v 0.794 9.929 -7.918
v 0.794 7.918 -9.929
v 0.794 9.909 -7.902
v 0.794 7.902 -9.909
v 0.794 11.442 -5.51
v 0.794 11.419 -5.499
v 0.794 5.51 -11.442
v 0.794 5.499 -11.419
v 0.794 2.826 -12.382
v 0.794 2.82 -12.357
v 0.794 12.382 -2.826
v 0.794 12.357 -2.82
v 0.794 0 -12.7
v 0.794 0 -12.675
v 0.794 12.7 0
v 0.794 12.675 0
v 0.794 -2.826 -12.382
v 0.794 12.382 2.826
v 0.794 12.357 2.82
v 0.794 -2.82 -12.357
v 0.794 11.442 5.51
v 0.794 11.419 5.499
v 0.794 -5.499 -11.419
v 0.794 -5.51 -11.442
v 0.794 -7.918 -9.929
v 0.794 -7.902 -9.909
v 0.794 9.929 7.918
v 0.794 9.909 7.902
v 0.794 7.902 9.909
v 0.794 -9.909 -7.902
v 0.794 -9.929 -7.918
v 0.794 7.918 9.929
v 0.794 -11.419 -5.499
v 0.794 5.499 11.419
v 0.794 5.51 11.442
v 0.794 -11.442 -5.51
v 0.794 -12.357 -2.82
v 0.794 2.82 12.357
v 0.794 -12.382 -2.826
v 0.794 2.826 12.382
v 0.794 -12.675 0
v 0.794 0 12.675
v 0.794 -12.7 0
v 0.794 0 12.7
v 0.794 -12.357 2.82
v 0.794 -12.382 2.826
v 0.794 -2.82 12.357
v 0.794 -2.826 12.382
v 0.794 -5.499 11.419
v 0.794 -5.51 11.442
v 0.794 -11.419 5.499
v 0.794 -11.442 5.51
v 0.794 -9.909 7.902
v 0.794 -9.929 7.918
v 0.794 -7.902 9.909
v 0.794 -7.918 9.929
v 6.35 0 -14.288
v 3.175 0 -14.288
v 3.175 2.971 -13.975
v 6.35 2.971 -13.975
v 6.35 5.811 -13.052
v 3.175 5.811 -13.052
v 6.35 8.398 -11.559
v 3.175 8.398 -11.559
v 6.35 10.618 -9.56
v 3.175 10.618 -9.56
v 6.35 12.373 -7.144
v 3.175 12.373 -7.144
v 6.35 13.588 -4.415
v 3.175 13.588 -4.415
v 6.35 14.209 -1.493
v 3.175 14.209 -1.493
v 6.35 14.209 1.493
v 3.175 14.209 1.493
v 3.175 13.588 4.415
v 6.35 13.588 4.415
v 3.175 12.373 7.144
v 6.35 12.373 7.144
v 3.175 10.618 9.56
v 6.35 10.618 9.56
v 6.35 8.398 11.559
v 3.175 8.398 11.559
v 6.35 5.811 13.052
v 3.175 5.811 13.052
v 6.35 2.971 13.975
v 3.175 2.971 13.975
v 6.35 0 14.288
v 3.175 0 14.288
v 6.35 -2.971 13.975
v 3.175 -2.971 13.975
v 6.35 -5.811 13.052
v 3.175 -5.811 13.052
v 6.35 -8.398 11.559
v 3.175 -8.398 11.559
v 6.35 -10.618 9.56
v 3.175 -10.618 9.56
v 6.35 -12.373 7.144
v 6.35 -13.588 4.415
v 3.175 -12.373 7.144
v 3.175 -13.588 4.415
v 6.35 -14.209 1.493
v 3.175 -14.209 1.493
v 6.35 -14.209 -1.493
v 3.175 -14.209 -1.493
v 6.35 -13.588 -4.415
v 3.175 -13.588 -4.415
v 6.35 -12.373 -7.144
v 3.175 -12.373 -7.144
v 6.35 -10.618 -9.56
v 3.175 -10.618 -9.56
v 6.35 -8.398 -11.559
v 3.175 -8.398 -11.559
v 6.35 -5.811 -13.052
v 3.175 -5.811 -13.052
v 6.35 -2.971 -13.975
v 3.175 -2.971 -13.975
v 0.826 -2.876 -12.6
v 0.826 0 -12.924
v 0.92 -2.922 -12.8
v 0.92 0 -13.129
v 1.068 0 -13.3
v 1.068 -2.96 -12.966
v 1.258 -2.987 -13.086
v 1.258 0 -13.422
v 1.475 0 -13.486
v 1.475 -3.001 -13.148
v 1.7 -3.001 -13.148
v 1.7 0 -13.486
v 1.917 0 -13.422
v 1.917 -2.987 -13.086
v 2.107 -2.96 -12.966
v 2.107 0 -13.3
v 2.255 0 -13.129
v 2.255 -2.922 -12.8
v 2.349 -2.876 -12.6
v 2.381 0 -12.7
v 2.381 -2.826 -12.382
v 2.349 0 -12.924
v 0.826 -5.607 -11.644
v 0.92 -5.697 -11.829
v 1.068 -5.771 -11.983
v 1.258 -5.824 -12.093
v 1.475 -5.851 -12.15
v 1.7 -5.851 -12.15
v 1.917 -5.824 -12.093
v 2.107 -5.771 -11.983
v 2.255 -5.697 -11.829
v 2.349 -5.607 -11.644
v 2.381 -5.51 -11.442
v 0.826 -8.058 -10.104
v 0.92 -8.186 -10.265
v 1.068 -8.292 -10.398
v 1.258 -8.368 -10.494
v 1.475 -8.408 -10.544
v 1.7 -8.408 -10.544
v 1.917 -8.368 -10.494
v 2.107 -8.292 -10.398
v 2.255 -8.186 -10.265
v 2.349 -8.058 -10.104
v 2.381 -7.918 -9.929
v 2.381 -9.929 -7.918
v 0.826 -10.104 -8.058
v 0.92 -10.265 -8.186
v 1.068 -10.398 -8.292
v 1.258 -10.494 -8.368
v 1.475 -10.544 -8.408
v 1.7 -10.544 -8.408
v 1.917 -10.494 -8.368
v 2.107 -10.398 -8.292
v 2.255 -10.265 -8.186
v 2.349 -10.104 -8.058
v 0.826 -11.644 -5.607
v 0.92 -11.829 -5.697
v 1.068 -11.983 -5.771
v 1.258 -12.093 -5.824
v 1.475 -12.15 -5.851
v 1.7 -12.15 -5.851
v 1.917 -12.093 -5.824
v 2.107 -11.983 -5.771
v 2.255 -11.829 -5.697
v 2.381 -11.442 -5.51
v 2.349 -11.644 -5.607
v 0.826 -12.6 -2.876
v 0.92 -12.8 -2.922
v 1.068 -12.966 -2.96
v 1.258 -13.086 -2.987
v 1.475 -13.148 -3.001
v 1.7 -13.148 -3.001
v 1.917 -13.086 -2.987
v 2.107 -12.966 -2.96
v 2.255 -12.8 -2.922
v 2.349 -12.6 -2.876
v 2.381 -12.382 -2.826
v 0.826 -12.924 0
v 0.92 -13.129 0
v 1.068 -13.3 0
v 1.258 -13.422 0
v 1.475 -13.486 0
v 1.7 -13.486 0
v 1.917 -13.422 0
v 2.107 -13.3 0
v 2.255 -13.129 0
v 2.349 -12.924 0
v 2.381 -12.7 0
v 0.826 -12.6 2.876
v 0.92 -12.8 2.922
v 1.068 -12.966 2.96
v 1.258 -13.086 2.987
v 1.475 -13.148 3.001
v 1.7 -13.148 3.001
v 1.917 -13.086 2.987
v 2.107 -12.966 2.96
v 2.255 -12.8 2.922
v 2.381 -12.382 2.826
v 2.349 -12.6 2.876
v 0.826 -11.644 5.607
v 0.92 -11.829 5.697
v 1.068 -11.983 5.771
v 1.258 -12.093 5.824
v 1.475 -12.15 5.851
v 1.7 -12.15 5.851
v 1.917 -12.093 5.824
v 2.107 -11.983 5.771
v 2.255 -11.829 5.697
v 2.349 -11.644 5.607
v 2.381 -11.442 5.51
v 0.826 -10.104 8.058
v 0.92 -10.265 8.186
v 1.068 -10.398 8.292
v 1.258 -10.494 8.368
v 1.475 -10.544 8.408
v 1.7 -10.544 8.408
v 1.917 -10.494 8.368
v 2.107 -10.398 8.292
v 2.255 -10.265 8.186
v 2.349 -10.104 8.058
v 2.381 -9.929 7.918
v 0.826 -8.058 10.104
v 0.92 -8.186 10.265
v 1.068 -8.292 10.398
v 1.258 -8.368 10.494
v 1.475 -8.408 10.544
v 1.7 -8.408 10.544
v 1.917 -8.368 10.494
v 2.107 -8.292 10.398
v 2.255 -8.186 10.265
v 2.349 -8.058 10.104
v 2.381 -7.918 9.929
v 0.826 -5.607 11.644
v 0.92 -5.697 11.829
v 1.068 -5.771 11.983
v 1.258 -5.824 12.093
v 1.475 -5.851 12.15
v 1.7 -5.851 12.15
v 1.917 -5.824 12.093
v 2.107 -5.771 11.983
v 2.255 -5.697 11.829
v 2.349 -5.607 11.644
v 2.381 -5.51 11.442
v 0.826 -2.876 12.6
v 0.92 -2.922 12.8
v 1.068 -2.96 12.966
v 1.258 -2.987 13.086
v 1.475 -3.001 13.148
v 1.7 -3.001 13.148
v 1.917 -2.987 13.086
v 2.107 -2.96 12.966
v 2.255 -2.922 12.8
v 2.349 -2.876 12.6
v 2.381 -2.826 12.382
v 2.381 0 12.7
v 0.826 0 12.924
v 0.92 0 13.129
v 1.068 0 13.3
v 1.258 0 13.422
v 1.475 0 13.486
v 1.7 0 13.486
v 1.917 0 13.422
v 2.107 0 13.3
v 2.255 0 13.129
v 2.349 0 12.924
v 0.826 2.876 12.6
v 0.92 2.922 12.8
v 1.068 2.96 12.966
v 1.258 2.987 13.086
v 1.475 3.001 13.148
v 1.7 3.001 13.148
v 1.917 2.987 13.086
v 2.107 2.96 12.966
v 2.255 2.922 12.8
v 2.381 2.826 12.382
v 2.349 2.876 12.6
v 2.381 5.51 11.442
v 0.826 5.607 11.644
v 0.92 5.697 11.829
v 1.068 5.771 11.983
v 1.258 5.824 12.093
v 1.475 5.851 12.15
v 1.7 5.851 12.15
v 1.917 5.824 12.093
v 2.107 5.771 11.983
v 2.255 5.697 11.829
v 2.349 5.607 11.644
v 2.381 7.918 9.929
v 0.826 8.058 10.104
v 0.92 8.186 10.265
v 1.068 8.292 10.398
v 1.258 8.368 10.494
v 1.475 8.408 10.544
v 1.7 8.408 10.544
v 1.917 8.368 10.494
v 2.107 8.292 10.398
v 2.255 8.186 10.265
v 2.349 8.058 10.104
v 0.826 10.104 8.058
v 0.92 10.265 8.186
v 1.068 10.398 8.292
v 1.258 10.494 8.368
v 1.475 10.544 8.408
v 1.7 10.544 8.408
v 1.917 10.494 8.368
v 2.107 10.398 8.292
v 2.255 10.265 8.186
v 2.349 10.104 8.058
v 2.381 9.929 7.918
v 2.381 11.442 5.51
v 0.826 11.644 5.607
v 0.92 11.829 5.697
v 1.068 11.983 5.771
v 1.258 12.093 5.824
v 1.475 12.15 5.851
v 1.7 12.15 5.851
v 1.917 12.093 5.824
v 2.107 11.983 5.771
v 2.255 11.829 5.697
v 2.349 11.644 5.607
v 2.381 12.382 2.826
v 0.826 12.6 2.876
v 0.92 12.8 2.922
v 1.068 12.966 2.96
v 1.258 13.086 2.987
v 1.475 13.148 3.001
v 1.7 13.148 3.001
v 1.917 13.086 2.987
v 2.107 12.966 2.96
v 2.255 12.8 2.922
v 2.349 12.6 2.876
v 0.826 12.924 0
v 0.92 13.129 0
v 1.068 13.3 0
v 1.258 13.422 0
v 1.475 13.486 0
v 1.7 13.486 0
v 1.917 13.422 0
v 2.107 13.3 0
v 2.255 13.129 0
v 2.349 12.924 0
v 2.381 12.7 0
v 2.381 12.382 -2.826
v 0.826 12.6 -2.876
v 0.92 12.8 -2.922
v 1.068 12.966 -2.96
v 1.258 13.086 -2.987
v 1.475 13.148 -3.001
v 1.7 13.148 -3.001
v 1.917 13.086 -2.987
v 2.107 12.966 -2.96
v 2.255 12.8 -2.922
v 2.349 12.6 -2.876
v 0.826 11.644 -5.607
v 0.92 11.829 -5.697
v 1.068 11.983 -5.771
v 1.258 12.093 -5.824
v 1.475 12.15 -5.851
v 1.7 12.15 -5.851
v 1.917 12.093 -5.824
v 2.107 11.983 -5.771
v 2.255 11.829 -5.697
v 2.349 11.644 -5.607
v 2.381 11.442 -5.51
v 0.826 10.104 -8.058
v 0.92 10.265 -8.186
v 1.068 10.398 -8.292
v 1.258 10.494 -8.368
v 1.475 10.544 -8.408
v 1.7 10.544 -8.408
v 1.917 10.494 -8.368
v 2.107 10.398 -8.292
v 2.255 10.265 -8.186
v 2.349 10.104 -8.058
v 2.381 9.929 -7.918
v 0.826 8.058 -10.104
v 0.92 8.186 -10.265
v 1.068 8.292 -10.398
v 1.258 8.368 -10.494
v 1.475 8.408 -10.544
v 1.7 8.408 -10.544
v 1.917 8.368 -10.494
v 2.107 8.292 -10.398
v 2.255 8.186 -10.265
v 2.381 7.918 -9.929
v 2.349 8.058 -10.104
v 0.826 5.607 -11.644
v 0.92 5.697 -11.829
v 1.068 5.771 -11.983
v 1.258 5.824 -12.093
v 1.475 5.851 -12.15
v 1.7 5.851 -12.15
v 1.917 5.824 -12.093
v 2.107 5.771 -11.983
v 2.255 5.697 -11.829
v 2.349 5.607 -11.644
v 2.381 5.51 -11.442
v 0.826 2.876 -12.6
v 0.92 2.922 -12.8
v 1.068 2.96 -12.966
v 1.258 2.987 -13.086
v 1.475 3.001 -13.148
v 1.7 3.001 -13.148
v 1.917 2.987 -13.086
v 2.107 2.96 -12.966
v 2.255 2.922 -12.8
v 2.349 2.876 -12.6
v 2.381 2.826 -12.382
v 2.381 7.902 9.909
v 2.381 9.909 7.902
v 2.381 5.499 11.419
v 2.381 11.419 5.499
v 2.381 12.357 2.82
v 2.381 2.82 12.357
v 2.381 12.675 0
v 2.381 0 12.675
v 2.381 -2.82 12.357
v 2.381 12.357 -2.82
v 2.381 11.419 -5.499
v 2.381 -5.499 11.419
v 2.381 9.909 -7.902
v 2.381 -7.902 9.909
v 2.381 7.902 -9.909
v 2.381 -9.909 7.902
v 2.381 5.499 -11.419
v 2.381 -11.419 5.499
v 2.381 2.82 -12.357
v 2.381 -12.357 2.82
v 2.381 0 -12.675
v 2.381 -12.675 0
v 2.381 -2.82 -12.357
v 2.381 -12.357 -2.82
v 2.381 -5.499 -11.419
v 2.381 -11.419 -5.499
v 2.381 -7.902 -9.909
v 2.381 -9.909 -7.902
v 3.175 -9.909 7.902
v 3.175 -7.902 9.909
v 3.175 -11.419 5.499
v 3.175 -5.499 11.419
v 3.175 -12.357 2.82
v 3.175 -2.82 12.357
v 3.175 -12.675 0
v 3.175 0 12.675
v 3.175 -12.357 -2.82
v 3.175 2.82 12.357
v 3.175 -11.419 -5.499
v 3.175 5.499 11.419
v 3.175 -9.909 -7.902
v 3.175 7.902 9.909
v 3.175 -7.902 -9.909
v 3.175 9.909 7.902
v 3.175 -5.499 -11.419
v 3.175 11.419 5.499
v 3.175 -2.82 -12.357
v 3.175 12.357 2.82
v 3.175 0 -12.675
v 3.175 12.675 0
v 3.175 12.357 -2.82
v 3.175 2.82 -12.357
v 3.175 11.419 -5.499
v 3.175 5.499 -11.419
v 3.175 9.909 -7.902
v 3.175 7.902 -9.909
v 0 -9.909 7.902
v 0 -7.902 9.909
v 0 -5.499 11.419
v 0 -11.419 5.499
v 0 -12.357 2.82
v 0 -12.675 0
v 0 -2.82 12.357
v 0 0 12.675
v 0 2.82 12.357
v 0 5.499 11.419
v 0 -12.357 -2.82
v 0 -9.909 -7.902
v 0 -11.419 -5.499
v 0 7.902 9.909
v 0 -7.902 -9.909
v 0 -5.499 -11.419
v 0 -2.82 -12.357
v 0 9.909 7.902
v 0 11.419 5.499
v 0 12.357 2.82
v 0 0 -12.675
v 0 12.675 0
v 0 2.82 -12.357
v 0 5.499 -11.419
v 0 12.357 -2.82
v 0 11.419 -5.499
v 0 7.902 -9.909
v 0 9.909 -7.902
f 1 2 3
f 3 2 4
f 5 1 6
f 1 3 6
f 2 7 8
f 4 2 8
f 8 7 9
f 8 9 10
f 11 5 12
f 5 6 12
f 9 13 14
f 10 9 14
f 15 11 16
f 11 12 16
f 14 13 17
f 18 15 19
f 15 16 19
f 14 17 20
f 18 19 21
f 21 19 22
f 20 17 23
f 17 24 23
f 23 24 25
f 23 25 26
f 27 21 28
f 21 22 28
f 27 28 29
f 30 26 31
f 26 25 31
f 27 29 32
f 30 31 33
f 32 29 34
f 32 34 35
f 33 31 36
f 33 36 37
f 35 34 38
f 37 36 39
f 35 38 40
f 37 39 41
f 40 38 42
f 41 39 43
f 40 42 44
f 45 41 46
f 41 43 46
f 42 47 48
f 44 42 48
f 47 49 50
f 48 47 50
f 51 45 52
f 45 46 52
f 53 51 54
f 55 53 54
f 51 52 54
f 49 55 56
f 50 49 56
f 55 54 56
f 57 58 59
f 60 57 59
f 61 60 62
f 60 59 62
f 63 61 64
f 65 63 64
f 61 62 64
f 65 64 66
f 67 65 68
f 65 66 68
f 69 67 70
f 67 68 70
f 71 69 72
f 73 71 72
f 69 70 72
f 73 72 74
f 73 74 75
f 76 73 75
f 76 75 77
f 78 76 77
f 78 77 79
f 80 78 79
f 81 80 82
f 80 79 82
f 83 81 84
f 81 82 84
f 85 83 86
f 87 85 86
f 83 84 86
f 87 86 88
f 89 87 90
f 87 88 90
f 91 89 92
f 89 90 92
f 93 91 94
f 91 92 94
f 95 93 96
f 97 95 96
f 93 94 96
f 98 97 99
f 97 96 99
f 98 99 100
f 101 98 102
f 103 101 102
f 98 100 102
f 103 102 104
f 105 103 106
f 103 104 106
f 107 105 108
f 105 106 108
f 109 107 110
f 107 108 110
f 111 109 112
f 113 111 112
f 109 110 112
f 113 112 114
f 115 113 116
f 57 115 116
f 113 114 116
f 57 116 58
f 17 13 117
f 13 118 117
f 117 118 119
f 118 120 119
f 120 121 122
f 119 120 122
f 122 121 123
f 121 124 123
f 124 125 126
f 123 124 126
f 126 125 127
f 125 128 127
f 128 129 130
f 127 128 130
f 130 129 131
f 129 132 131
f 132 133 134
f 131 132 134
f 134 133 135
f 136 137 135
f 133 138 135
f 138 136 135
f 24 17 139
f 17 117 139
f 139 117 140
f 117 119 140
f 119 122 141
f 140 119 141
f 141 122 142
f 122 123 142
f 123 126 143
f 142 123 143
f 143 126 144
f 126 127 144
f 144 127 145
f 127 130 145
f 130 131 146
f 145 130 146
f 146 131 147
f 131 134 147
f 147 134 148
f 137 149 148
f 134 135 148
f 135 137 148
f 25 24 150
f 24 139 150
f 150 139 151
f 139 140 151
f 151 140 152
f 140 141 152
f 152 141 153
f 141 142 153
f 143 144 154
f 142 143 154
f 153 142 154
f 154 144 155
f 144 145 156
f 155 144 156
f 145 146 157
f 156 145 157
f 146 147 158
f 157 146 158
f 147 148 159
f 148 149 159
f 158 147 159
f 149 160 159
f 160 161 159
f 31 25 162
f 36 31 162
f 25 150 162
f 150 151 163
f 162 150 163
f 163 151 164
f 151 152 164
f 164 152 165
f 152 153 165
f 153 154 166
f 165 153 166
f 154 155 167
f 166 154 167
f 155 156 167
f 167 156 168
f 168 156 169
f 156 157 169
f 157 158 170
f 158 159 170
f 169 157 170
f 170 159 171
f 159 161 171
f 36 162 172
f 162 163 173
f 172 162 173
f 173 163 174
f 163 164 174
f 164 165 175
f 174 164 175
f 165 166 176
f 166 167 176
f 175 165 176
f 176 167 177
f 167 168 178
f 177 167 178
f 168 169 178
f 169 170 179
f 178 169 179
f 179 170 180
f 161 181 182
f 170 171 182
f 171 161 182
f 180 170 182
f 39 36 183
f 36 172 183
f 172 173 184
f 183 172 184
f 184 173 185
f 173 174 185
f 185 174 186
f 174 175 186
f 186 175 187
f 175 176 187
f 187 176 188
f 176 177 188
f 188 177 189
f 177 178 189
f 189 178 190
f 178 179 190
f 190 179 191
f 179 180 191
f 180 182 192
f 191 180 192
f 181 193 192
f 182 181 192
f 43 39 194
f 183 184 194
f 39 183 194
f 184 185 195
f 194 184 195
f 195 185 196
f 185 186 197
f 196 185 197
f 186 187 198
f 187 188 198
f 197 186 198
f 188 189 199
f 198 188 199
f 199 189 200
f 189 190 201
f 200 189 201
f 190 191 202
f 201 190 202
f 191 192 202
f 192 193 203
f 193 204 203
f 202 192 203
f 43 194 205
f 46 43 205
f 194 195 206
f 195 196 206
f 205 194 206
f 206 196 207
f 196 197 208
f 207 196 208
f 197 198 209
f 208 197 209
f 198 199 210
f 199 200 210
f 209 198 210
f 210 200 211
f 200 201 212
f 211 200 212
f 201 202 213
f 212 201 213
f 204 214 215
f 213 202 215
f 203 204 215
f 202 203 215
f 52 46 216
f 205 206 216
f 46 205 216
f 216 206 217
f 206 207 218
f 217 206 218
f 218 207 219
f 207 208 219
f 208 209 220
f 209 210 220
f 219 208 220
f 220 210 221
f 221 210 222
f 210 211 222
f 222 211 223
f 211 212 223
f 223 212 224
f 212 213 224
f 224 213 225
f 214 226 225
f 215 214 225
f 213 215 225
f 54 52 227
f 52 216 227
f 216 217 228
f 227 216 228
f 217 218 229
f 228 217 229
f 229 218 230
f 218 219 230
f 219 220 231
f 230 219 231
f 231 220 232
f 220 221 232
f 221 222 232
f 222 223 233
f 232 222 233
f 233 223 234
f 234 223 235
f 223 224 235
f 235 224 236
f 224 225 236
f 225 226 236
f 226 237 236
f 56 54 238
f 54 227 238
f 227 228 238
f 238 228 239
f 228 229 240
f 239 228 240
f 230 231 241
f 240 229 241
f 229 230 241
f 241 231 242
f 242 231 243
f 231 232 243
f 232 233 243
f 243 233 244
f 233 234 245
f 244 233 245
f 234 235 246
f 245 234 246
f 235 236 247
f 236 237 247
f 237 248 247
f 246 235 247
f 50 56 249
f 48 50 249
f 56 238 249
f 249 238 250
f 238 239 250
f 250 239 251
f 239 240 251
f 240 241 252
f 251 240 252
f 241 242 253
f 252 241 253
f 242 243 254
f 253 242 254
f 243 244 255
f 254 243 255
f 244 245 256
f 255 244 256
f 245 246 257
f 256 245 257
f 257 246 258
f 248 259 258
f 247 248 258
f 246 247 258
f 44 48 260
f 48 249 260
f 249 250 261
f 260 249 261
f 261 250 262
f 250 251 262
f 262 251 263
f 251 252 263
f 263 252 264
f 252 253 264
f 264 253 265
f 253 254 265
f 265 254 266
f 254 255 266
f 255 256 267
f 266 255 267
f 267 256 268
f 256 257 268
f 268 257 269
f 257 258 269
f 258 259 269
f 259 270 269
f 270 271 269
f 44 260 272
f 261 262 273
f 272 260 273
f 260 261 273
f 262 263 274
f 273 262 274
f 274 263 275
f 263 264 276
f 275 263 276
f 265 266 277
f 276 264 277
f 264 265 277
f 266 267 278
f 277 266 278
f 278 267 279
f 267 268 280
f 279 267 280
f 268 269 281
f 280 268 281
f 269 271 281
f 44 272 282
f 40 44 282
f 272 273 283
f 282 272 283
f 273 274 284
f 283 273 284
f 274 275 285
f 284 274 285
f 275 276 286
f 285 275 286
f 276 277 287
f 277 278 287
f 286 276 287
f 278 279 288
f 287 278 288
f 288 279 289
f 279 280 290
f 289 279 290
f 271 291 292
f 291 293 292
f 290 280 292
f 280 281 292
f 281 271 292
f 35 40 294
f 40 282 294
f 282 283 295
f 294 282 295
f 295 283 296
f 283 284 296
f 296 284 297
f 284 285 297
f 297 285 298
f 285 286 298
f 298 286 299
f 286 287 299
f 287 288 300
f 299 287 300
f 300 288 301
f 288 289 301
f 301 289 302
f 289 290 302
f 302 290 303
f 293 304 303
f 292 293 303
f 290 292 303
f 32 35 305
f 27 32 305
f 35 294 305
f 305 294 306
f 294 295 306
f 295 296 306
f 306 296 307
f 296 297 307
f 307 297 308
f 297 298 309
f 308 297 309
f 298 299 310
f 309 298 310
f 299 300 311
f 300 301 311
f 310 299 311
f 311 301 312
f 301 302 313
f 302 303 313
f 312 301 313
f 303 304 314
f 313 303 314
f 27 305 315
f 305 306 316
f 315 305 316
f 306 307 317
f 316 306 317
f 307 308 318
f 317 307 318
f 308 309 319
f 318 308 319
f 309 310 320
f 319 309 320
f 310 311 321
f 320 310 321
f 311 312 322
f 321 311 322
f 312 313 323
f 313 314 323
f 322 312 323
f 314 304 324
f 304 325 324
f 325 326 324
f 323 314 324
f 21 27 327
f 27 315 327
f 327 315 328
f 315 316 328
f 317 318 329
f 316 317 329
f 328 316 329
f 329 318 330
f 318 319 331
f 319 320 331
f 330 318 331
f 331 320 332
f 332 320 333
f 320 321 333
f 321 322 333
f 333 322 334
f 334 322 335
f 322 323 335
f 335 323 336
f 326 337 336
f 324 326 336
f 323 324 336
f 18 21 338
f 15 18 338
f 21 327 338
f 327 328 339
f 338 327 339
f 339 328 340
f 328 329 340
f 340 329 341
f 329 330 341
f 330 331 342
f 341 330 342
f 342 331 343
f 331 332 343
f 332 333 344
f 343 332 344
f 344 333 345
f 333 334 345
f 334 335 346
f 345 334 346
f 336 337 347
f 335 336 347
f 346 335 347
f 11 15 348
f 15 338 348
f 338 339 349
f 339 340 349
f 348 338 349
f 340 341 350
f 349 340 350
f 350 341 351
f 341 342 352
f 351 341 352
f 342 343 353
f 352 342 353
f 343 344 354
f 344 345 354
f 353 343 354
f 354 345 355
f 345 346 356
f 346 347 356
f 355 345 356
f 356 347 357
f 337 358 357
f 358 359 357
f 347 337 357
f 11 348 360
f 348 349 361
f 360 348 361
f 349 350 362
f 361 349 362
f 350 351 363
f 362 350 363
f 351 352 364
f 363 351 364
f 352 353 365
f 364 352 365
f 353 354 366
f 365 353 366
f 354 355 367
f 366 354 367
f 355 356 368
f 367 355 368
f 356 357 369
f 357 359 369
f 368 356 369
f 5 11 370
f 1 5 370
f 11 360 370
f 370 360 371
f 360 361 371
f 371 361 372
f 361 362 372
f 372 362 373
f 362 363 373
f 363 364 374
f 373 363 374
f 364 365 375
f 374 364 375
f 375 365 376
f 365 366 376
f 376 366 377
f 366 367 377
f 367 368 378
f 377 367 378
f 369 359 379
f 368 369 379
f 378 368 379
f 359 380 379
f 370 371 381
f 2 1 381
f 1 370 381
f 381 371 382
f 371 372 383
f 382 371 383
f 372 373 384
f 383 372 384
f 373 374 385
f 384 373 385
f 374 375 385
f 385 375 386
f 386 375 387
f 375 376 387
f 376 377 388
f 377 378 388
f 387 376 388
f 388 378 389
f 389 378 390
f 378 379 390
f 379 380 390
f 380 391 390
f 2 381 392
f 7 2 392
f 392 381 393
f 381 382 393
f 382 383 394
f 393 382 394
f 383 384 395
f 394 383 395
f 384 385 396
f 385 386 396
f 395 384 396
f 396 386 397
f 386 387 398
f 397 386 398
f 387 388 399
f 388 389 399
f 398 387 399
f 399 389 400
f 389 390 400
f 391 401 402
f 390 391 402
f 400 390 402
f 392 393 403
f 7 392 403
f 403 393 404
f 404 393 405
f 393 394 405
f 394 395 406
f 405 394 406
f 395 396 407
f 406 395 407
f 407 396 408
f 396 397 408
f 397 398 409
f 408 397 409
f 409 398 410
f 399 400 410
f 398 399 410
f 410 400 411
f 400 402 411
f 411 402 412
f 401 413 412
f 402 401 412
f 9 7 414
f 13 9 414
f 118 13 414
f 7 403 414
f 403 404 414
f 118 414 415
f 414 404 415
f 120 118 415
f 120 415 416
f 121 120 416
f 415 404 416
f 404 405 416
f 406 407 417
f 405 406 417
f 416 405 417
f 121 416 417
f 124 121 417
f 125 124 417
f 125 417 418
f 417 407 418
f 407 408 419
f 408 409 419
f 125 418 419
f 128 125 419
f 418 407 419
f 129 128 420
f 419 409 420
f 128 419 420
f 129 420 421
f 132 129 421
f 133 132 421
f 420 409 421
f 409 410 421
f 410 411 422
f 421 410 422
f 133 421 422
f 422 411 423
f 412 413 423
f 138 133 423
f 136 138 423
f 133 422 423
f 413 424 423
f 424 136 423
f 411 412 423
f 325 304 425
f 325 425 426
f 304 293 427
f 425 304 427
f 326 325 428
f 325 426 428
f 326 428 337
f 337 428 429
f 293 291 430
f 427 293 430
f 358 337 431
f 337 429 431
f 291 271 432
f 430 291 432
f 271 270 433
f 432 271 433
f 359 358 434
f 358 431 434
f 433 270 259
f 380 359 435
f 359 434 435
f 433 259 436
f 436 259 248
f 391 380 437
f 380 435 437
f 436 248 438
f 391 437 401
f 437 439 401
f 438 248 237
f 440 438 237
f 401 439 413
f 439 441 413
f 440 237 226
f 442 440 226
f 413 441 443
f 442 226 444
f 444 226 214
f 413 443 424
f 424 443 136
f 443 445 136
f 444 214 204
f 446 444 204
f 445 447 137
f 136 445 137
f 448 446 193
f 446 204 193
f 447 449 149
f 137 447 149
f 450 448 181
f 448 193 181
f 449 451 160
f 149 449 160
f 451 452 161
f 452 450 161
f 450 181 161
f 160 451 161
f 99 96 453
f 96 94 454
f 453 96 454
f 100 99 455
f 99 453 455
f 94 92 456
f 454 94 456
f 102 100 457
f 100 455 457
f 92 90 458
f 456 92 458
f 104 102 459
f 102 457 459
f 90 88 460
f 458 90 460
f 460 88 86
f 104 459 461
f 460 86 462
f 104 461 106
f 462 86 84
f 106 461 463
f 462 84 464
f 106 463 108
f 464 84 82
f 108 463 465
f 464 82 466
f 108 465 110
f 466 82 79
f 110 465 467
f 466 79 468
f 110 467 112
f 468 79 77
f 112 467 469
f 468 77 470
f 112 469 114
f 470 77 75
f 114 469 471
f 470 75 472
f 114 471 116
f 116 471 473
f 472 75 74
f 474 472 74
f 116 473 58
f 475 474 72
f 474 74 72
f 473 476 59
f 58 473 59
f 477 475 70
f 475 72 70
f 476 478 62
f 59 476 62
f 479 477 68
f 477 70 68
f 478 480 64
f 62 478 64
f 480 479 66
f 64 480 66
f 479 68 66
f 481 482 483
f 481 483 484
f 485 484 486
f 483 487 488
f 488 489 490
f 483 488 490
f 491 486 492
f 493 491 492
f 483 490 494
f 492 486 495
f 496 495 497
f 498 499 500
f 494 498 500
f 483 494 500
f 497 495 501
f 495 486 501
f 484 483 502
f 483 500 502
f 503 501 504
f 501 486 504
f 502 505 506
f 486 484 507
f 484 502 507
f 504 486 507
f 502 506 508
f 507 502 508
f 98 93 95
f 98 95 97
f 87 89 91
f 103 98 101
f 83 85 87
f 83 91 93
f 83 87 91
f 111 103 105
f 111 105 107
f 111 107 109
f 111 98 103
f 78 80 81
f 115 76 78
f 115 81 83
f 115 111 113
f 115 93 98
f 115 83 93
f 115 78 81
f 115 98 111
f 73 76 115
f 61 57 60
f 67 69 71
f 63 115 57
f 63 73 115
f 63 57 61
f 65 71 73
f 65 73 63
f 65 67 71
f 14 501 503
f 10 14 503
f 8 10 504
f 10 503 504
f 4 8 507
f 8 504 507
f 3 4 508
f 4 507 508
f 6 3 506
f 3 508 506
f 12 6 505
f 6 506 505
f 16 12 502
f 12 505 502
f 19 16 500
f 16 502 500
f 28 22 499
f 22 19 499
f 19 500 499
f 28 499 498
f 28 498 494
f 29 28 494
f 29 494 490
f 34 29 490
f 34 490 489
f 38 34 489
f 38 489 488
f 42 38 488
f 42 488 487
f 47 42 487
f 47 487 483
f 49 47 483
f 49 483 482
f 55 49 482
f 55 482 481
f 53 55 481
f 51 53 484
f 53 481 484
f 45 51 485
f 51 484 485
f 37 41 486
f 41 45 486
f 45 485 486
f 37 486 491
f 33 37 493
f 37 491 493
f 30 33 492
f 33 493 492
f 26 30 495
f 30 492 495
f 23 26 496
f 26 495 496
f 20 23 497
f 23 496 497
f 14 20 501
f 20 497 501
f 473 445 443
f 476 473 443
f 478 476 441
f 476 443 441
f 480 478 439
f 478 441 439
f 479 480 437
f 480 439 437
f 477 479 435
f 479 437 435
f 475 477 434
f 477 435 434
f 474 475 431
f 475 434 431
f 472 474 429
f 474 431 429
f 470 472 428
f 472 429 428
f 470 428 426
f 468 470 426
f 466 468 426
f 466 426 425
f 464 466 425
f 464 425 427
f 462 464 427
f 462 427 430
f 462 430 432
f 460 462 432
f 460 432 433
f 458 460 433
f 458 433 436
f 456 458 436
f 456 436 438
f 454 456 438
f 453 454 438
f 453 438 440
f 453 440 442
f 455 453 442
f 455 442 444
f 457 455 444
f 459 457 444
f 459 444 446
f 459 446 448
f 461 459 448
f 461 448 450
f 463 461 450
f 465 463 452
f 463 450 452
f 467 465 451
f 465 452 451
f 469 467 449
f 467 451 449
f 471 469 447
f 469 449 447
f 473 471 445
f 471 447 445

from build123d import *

# Parameters (mm, degrees)
SKETCH1_R           = 12.6746
BOSS_EXTRUDE1_DEPTH = 3.175
SKETCH2_R           = 14.2875
BOSS_EXTRUDE2_DEPTH = 3.175


with BuildPart() as part:
    # Sketch1 → Boss-Extrude1 (new body)
    with BuildSketch(Plane(origin=(0, 0, 0), x_dir=(0, 0, -1), z_dir=(1, 0, 0))):
        Circle(SKETCH1_R)
    extrude(amount=BOSS_EXTRUDE1_DEPTH)

    # Sketch2 → Boss-Extrude2 (add)
    with BuildSketch(Plane(origin=(3.175, 0, 0), x_dir=(0, 0, -1), z_dir=(1, 0, 0))):
        Circle(SKETCH2_R)
    extrude(amount=BOSS_EXTRUDE2_DEPTH)

    # Sketch3 → Revolve1 (revolve)
    with BuildSketch(Plane.XY, mode=Mode.PRIVATE) as revolve1_sk:
        with BuildLine():
            Line((2.38125, 12.7), (2.38125, 11.90625))
            Line((2.38125, 11.90625), (0.79375, 11.90625))
            Line((0.79375, 11.90625), (0.79375, 12.7))
            ThreePointArc((0.79375, 12.7), (1.5875, 13.49375), (2.38125, 12.7))
        make_face()
    revolve(revolve1_sk.sketch.rotate(Axis((0, 0, 0), (-1, 0, 0)), 90), axis=Axis((0, 0, 0), (-1, 0, 0)))


solid = part.part
